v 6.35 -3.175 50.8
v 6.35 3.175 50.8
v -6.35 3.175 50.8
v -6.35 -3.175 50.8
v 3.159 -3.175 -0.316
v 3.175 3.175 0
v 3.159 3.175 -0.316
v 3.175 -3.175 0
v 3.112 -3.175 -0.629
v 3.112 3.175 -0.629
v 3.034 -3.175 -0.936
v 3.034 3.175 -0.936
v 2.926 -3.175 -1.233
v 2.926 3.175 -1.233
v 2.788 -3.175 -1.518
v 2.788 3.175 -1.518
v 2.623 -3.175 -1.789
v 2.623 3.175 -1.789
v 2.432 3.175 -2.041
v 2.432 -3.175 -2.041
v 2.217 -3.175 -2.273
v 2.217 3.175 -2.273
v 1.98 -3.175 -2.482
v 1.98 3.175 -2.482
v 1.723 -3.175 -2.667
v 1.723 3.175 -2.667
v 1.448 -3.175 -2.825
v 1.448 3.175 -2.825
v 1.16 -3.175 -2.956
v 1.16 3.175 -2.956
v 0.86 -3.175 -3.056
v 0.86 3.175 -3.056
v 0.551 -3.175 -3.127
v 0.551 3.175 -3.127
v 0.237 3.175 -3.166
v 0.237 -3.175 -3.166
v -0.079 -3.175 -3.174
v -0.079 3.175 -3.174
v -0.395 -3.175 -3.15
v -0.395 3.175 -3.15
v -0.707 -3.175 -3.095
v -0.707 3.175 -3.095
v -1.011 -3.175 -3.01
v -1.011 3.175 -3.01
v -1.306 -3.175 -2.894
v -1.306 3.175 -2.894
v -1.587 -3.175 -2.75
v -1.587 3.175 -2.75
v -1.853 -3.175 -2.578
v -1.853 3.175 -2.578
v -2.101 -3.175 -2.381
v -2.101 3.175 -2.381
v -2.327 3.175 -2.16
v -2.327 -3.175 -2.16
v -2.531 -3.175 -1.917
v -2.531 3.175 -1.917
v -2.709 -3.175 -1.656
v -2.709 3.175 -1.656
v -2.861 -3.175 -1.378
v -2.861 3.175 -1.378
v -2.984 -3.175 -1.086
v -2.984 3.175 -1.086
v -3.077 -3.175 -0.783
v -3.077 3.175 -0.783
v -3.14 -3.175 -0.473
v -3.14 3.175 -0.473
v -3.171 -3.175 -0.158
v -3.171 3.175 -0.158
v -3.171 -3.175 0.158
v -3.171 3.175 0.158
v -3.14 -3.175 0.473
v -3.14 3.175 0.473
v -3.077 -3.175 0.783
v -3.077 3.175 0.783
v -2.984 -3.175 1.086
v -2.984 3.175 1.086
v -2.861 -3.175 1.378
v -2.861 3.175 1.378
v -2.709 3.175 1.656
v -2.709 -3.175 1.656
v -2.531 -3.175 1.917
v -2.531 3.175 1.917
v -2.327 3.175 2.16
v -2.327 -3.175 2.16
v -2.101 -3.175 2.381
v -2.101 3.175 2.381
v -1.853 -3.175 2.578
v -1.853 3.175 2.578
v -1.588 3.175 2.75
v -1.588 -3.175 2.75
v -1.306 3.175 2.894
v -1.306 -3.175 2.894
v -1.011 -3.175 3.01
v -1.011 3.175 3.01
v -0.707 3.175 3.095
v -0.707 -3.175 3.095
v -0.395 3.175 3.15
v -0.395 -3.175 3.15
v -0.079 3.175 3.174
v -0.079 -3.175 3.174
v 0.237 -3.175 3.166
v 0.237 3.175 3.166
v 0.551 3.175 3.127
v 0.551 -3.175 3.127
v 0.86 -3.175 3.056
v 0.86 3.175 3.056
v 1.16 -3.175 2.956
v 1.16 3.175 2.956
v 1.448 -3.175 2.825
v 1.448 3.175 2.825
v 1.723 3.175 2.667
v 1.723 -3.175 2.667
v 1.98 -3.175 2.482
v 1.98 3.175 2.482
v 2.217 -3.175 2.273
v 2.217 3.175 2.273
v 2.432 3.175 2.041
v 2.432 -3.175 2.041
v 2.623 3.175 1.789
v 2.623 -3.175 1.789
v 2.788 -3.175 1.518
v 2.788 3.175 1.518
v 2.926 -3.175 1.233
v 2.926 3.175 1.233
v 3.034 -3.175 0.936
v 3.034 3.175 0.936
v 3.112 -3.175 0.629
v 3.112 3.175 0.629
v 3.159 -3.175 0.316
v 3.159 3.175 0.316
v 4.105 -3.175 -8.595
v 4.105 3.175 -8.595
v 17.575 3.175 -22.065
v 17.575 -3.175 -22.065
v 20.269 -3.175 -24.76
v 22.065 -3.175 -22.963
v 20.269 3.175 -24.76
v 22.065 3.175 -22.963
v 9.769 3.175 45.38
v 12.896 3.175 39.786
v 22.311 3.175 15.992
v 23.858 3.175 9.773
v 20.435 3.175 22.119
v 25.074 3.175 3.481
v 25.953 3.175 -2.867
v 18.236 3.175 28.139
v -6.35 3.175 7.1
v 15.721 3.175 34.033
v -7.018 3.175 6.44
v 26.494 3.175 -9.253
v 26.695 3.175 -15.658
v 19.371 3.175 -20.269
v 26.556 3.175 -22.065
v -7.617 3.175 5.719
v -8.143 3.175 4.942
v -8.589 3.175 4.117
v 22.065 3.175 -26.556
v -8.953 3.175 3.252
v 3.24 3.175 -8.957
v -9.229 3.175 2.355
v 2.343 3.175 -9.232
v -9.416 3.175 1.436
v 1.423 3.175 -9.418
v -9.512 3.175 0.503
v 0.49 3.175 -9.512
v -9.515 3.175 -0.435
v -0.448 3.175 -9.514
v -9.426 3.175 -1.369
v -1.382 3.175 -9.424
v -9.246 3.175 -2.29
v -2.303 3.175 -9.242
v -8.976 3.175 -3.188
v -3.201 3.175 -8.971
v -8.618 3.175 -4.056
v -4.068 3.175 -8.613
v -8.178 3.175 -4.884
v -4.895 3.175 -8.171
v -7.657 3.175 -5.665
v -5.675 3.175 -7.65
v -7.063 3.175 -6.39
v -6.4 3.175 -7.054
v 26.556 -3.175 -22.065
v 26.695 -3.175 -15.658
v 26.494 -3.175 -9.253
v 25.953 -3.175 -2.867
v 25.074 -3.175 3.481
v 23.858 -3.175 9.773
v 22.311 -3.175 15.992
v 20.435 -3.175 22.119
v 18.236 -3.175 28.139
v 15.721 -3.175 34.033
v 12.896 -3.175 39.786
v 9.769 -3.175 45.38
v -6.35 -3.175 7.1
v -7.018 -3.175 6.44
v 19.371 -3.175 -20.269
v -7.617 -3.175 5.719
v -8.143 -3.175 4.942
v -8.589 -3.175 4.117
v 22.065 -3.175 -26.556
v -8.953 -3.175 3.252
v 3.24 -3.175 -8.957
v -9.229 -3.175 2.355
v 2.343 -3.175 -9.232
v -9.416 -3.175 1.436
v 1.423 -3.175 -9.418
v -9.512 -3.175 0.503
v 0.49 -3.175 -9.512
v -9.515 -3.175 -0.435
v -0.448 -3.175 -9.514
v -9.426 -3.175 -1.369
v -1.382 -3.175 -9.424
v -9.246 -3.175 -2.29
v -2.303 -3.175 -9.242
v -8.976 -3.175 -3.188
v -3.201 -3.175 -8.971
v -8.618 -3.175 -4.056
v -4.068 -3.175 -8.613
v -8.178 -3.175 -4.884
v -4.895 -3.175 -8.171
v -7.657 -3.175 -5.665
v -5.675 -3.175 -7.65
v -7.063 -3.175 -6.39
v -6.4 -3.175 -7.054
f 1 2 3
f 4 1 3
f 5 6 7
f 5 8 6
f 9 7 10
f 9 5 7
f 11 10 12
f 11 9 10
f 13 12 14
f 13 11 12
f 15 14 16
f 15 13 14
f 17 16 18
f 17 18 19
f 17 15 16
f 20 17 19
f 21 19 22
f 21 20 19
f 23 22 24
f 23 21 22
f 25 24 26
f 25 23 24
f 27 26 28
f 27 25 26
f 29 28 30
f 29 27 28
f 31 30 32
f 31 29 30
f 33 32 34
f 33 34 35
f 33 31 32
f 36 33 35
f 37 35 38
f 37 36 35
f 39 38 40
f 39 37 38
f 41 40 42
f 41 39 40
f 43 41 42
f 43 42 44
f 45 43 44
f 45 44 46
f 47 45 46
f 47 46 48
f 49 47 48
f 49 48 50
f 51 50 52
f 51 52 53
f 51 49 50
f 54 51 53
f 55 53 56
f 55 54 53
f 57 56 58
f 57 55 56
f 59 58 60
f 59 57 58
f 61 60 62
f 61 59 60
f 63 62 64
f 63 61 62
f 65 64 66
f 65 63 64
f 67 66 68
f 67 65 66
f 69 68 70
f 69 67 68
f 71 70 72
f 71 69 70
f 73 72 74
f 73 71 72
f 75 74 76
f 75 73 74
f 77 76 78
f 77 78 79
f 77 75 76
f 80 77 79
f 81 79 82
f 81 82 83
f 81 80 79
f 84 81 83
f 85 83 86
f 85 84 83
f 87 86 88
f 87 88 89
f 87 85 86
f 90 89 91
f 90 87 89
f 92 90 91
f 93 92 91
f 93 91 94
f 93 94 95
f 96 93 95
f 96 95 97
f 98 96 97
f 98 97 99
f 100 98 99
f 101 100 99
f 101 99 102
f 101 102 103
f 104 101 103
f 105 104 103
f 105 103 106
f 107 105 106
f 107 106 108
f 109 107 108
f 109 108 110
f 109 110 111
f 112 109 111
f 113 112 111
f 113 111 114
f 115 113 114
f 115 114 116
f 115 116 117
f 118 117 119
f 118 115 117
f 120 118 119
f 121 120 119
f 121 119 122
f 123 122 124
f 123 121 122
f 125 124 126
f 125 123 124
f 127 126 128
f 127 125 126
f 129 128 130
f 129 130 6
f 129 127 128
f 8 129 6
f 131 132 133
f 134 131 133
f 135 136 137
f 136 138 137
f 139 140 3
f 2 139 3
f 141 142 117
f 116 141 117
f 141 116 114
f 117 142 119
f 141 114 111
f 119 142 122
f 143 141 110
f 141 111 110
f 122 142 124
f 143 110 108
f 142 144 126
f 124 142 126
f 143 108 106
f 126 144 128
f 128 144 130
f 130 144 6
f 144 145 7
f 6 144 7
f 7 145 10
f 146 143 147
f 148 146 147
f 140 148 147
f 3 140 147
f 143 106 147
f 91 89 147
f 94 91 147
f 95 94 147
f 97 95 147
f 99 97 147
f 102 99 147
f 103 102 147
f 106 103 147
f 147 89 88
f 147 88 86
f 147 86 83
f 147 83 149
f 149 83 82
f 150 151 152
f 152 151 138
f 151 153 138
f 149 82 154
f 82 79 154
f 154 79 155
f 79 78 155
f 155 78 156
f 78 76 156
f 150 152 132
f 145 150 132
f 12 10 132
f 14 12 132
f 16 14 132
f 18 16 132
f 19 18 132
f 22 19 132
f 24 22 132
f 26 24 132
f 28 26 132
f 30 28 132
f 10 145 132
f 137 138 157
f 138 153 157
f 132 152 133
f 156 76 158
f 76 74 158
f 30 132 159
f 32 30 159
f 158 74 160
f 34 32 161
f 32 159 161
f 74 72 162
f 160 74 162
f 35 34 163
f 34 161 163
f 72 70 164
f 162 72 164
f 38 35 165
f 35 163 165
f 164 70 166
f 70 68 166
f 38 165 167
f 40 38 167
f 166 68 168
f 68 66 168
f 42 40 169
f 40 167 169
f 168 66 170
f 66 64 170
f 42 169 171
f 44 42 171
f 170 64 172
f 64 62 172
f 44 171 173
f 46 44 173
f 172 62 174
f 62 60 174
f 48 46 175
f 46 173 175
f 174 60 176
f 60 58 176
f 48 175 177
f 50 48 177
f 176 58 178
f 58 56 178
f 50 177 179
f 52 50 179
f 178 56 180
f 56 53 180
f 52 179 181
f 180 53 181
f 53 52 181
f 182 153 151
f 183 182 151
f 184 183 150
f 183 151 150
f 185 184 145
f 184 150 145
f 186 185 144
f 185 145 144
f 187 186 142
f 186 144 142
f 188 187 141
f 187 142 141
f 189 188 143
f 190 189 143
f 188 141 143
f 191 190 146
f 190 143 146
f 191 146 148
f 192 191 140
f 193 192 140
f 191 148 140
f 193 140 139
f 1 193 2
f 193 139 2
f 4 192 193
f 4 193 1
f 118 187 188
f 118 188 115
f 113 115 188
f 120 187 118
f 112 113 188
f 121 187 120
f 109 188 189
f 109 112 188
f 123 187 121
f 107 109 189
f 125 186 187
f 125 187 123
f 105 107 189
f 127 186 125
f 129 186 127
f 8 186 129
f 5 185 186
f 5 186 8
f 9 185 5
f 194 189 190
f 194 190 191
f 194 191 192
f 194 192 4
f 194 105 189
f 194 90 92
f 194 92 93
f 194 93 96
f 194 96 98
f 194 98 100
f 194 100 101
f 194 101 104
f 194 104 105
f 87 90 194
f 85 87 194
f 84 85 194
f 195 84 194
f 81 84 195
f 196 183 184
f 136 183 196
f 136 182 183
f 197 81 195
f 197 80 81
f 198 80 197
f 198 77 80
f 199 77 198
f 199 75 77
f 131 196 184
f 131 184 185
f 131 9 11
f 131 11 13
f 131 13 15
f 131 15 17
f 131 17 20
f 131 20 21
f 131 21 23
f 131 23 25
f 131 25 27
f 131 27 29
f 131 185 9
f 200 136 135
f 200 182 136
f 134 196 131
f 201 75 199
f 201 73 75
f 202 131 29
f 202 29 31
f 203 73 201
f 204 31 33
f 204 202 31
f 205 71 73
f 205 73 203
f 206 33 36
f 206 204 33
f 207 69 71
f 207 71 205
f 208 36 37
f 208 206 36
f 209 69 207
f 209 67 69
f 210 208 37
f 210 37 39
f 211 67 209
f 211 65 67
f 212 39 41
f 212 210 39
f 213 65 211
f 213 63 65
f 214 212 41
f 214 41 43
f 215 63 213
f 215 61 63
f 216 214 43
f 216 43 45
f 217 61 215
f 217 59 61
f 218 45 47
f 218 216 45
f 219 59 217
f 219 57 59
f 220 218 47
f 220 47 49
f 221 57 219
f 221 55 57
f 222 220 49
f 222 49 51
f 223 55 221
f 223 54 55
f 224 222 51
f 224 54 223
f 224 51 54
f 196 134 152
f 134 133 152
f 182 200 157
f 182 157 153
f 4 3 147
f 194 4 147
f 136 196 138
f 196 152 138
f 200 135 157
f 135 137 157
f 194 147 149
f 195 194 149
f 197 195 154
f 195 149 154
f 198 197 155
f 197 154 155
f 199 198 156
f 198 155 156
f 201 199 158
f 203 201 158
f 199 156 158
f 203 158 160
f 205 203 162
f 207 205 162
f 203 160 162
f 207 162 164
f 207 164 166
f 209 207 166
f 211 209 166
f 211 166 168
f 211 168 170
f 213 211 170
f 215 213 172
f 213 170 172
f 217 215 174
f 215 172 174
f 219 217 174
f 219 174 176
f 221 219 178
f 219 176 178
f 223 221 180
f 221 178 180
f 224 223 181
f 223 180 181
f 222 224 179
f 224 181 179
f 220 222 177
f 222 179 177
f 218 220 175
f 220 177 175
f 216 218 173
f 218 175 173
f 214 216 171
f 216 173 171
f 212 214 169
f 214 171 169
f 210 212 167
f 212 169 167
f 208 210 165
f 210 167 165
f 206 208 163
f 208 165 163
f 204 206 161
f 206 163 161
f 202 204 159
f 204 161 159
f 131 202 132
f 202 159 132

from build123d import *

# Parameters (mm, degrees)
SKETCH1_R           = 3.175
BOSS_EXTRUDE1_DEPTH = 3.175


with BuildPart() as part:
    # Sketch1 → Boss-Extrude1 (new body, symmetric)
    with BuildSketch(Plane(origin=(0, 0, 0), x_dir=(1, 0, 0), z_dir=(0, 1, 0))):
        with BuildLine():
            Line((4.10493597, 8.59506403), (17.575320151, 22.065448212))
            Line((17.575320151, 22.065448212), (19.371371376, 20.269396988))
            Line((19.371371376, 20.269396988), (22.065448212, 22.963473824))
            Line((22.065448212, 22.963473824), (20.269396988, 24.759525048))
            Line((20.269396988, 24.759525048), (22.065448212, 26.555576272))
            Line((22.065448212, 26.555576272), (26.555576272, 22.065448212))
            ThreePointArc((26.555576272, 22.065448212), (22.310576634, -15.991639638), (6.35, -50.8))
            Line((6.35, -50.8), (-6.35, -50.8))
            Line((-6.35, -50.8), (-6.35, -7.099515829))
            ThreePointArc((-6.35, -7.099515829), (-7.92717083, 5.280680604), (4.10493597, 8.59506403))
        make_face()
        Circle(SKETCH1_R, mode=Mode.SUBTRACT)
    extrude(amount=BOSS_EXTRUDE1_DEPTH, both=True)


solid = part.part
